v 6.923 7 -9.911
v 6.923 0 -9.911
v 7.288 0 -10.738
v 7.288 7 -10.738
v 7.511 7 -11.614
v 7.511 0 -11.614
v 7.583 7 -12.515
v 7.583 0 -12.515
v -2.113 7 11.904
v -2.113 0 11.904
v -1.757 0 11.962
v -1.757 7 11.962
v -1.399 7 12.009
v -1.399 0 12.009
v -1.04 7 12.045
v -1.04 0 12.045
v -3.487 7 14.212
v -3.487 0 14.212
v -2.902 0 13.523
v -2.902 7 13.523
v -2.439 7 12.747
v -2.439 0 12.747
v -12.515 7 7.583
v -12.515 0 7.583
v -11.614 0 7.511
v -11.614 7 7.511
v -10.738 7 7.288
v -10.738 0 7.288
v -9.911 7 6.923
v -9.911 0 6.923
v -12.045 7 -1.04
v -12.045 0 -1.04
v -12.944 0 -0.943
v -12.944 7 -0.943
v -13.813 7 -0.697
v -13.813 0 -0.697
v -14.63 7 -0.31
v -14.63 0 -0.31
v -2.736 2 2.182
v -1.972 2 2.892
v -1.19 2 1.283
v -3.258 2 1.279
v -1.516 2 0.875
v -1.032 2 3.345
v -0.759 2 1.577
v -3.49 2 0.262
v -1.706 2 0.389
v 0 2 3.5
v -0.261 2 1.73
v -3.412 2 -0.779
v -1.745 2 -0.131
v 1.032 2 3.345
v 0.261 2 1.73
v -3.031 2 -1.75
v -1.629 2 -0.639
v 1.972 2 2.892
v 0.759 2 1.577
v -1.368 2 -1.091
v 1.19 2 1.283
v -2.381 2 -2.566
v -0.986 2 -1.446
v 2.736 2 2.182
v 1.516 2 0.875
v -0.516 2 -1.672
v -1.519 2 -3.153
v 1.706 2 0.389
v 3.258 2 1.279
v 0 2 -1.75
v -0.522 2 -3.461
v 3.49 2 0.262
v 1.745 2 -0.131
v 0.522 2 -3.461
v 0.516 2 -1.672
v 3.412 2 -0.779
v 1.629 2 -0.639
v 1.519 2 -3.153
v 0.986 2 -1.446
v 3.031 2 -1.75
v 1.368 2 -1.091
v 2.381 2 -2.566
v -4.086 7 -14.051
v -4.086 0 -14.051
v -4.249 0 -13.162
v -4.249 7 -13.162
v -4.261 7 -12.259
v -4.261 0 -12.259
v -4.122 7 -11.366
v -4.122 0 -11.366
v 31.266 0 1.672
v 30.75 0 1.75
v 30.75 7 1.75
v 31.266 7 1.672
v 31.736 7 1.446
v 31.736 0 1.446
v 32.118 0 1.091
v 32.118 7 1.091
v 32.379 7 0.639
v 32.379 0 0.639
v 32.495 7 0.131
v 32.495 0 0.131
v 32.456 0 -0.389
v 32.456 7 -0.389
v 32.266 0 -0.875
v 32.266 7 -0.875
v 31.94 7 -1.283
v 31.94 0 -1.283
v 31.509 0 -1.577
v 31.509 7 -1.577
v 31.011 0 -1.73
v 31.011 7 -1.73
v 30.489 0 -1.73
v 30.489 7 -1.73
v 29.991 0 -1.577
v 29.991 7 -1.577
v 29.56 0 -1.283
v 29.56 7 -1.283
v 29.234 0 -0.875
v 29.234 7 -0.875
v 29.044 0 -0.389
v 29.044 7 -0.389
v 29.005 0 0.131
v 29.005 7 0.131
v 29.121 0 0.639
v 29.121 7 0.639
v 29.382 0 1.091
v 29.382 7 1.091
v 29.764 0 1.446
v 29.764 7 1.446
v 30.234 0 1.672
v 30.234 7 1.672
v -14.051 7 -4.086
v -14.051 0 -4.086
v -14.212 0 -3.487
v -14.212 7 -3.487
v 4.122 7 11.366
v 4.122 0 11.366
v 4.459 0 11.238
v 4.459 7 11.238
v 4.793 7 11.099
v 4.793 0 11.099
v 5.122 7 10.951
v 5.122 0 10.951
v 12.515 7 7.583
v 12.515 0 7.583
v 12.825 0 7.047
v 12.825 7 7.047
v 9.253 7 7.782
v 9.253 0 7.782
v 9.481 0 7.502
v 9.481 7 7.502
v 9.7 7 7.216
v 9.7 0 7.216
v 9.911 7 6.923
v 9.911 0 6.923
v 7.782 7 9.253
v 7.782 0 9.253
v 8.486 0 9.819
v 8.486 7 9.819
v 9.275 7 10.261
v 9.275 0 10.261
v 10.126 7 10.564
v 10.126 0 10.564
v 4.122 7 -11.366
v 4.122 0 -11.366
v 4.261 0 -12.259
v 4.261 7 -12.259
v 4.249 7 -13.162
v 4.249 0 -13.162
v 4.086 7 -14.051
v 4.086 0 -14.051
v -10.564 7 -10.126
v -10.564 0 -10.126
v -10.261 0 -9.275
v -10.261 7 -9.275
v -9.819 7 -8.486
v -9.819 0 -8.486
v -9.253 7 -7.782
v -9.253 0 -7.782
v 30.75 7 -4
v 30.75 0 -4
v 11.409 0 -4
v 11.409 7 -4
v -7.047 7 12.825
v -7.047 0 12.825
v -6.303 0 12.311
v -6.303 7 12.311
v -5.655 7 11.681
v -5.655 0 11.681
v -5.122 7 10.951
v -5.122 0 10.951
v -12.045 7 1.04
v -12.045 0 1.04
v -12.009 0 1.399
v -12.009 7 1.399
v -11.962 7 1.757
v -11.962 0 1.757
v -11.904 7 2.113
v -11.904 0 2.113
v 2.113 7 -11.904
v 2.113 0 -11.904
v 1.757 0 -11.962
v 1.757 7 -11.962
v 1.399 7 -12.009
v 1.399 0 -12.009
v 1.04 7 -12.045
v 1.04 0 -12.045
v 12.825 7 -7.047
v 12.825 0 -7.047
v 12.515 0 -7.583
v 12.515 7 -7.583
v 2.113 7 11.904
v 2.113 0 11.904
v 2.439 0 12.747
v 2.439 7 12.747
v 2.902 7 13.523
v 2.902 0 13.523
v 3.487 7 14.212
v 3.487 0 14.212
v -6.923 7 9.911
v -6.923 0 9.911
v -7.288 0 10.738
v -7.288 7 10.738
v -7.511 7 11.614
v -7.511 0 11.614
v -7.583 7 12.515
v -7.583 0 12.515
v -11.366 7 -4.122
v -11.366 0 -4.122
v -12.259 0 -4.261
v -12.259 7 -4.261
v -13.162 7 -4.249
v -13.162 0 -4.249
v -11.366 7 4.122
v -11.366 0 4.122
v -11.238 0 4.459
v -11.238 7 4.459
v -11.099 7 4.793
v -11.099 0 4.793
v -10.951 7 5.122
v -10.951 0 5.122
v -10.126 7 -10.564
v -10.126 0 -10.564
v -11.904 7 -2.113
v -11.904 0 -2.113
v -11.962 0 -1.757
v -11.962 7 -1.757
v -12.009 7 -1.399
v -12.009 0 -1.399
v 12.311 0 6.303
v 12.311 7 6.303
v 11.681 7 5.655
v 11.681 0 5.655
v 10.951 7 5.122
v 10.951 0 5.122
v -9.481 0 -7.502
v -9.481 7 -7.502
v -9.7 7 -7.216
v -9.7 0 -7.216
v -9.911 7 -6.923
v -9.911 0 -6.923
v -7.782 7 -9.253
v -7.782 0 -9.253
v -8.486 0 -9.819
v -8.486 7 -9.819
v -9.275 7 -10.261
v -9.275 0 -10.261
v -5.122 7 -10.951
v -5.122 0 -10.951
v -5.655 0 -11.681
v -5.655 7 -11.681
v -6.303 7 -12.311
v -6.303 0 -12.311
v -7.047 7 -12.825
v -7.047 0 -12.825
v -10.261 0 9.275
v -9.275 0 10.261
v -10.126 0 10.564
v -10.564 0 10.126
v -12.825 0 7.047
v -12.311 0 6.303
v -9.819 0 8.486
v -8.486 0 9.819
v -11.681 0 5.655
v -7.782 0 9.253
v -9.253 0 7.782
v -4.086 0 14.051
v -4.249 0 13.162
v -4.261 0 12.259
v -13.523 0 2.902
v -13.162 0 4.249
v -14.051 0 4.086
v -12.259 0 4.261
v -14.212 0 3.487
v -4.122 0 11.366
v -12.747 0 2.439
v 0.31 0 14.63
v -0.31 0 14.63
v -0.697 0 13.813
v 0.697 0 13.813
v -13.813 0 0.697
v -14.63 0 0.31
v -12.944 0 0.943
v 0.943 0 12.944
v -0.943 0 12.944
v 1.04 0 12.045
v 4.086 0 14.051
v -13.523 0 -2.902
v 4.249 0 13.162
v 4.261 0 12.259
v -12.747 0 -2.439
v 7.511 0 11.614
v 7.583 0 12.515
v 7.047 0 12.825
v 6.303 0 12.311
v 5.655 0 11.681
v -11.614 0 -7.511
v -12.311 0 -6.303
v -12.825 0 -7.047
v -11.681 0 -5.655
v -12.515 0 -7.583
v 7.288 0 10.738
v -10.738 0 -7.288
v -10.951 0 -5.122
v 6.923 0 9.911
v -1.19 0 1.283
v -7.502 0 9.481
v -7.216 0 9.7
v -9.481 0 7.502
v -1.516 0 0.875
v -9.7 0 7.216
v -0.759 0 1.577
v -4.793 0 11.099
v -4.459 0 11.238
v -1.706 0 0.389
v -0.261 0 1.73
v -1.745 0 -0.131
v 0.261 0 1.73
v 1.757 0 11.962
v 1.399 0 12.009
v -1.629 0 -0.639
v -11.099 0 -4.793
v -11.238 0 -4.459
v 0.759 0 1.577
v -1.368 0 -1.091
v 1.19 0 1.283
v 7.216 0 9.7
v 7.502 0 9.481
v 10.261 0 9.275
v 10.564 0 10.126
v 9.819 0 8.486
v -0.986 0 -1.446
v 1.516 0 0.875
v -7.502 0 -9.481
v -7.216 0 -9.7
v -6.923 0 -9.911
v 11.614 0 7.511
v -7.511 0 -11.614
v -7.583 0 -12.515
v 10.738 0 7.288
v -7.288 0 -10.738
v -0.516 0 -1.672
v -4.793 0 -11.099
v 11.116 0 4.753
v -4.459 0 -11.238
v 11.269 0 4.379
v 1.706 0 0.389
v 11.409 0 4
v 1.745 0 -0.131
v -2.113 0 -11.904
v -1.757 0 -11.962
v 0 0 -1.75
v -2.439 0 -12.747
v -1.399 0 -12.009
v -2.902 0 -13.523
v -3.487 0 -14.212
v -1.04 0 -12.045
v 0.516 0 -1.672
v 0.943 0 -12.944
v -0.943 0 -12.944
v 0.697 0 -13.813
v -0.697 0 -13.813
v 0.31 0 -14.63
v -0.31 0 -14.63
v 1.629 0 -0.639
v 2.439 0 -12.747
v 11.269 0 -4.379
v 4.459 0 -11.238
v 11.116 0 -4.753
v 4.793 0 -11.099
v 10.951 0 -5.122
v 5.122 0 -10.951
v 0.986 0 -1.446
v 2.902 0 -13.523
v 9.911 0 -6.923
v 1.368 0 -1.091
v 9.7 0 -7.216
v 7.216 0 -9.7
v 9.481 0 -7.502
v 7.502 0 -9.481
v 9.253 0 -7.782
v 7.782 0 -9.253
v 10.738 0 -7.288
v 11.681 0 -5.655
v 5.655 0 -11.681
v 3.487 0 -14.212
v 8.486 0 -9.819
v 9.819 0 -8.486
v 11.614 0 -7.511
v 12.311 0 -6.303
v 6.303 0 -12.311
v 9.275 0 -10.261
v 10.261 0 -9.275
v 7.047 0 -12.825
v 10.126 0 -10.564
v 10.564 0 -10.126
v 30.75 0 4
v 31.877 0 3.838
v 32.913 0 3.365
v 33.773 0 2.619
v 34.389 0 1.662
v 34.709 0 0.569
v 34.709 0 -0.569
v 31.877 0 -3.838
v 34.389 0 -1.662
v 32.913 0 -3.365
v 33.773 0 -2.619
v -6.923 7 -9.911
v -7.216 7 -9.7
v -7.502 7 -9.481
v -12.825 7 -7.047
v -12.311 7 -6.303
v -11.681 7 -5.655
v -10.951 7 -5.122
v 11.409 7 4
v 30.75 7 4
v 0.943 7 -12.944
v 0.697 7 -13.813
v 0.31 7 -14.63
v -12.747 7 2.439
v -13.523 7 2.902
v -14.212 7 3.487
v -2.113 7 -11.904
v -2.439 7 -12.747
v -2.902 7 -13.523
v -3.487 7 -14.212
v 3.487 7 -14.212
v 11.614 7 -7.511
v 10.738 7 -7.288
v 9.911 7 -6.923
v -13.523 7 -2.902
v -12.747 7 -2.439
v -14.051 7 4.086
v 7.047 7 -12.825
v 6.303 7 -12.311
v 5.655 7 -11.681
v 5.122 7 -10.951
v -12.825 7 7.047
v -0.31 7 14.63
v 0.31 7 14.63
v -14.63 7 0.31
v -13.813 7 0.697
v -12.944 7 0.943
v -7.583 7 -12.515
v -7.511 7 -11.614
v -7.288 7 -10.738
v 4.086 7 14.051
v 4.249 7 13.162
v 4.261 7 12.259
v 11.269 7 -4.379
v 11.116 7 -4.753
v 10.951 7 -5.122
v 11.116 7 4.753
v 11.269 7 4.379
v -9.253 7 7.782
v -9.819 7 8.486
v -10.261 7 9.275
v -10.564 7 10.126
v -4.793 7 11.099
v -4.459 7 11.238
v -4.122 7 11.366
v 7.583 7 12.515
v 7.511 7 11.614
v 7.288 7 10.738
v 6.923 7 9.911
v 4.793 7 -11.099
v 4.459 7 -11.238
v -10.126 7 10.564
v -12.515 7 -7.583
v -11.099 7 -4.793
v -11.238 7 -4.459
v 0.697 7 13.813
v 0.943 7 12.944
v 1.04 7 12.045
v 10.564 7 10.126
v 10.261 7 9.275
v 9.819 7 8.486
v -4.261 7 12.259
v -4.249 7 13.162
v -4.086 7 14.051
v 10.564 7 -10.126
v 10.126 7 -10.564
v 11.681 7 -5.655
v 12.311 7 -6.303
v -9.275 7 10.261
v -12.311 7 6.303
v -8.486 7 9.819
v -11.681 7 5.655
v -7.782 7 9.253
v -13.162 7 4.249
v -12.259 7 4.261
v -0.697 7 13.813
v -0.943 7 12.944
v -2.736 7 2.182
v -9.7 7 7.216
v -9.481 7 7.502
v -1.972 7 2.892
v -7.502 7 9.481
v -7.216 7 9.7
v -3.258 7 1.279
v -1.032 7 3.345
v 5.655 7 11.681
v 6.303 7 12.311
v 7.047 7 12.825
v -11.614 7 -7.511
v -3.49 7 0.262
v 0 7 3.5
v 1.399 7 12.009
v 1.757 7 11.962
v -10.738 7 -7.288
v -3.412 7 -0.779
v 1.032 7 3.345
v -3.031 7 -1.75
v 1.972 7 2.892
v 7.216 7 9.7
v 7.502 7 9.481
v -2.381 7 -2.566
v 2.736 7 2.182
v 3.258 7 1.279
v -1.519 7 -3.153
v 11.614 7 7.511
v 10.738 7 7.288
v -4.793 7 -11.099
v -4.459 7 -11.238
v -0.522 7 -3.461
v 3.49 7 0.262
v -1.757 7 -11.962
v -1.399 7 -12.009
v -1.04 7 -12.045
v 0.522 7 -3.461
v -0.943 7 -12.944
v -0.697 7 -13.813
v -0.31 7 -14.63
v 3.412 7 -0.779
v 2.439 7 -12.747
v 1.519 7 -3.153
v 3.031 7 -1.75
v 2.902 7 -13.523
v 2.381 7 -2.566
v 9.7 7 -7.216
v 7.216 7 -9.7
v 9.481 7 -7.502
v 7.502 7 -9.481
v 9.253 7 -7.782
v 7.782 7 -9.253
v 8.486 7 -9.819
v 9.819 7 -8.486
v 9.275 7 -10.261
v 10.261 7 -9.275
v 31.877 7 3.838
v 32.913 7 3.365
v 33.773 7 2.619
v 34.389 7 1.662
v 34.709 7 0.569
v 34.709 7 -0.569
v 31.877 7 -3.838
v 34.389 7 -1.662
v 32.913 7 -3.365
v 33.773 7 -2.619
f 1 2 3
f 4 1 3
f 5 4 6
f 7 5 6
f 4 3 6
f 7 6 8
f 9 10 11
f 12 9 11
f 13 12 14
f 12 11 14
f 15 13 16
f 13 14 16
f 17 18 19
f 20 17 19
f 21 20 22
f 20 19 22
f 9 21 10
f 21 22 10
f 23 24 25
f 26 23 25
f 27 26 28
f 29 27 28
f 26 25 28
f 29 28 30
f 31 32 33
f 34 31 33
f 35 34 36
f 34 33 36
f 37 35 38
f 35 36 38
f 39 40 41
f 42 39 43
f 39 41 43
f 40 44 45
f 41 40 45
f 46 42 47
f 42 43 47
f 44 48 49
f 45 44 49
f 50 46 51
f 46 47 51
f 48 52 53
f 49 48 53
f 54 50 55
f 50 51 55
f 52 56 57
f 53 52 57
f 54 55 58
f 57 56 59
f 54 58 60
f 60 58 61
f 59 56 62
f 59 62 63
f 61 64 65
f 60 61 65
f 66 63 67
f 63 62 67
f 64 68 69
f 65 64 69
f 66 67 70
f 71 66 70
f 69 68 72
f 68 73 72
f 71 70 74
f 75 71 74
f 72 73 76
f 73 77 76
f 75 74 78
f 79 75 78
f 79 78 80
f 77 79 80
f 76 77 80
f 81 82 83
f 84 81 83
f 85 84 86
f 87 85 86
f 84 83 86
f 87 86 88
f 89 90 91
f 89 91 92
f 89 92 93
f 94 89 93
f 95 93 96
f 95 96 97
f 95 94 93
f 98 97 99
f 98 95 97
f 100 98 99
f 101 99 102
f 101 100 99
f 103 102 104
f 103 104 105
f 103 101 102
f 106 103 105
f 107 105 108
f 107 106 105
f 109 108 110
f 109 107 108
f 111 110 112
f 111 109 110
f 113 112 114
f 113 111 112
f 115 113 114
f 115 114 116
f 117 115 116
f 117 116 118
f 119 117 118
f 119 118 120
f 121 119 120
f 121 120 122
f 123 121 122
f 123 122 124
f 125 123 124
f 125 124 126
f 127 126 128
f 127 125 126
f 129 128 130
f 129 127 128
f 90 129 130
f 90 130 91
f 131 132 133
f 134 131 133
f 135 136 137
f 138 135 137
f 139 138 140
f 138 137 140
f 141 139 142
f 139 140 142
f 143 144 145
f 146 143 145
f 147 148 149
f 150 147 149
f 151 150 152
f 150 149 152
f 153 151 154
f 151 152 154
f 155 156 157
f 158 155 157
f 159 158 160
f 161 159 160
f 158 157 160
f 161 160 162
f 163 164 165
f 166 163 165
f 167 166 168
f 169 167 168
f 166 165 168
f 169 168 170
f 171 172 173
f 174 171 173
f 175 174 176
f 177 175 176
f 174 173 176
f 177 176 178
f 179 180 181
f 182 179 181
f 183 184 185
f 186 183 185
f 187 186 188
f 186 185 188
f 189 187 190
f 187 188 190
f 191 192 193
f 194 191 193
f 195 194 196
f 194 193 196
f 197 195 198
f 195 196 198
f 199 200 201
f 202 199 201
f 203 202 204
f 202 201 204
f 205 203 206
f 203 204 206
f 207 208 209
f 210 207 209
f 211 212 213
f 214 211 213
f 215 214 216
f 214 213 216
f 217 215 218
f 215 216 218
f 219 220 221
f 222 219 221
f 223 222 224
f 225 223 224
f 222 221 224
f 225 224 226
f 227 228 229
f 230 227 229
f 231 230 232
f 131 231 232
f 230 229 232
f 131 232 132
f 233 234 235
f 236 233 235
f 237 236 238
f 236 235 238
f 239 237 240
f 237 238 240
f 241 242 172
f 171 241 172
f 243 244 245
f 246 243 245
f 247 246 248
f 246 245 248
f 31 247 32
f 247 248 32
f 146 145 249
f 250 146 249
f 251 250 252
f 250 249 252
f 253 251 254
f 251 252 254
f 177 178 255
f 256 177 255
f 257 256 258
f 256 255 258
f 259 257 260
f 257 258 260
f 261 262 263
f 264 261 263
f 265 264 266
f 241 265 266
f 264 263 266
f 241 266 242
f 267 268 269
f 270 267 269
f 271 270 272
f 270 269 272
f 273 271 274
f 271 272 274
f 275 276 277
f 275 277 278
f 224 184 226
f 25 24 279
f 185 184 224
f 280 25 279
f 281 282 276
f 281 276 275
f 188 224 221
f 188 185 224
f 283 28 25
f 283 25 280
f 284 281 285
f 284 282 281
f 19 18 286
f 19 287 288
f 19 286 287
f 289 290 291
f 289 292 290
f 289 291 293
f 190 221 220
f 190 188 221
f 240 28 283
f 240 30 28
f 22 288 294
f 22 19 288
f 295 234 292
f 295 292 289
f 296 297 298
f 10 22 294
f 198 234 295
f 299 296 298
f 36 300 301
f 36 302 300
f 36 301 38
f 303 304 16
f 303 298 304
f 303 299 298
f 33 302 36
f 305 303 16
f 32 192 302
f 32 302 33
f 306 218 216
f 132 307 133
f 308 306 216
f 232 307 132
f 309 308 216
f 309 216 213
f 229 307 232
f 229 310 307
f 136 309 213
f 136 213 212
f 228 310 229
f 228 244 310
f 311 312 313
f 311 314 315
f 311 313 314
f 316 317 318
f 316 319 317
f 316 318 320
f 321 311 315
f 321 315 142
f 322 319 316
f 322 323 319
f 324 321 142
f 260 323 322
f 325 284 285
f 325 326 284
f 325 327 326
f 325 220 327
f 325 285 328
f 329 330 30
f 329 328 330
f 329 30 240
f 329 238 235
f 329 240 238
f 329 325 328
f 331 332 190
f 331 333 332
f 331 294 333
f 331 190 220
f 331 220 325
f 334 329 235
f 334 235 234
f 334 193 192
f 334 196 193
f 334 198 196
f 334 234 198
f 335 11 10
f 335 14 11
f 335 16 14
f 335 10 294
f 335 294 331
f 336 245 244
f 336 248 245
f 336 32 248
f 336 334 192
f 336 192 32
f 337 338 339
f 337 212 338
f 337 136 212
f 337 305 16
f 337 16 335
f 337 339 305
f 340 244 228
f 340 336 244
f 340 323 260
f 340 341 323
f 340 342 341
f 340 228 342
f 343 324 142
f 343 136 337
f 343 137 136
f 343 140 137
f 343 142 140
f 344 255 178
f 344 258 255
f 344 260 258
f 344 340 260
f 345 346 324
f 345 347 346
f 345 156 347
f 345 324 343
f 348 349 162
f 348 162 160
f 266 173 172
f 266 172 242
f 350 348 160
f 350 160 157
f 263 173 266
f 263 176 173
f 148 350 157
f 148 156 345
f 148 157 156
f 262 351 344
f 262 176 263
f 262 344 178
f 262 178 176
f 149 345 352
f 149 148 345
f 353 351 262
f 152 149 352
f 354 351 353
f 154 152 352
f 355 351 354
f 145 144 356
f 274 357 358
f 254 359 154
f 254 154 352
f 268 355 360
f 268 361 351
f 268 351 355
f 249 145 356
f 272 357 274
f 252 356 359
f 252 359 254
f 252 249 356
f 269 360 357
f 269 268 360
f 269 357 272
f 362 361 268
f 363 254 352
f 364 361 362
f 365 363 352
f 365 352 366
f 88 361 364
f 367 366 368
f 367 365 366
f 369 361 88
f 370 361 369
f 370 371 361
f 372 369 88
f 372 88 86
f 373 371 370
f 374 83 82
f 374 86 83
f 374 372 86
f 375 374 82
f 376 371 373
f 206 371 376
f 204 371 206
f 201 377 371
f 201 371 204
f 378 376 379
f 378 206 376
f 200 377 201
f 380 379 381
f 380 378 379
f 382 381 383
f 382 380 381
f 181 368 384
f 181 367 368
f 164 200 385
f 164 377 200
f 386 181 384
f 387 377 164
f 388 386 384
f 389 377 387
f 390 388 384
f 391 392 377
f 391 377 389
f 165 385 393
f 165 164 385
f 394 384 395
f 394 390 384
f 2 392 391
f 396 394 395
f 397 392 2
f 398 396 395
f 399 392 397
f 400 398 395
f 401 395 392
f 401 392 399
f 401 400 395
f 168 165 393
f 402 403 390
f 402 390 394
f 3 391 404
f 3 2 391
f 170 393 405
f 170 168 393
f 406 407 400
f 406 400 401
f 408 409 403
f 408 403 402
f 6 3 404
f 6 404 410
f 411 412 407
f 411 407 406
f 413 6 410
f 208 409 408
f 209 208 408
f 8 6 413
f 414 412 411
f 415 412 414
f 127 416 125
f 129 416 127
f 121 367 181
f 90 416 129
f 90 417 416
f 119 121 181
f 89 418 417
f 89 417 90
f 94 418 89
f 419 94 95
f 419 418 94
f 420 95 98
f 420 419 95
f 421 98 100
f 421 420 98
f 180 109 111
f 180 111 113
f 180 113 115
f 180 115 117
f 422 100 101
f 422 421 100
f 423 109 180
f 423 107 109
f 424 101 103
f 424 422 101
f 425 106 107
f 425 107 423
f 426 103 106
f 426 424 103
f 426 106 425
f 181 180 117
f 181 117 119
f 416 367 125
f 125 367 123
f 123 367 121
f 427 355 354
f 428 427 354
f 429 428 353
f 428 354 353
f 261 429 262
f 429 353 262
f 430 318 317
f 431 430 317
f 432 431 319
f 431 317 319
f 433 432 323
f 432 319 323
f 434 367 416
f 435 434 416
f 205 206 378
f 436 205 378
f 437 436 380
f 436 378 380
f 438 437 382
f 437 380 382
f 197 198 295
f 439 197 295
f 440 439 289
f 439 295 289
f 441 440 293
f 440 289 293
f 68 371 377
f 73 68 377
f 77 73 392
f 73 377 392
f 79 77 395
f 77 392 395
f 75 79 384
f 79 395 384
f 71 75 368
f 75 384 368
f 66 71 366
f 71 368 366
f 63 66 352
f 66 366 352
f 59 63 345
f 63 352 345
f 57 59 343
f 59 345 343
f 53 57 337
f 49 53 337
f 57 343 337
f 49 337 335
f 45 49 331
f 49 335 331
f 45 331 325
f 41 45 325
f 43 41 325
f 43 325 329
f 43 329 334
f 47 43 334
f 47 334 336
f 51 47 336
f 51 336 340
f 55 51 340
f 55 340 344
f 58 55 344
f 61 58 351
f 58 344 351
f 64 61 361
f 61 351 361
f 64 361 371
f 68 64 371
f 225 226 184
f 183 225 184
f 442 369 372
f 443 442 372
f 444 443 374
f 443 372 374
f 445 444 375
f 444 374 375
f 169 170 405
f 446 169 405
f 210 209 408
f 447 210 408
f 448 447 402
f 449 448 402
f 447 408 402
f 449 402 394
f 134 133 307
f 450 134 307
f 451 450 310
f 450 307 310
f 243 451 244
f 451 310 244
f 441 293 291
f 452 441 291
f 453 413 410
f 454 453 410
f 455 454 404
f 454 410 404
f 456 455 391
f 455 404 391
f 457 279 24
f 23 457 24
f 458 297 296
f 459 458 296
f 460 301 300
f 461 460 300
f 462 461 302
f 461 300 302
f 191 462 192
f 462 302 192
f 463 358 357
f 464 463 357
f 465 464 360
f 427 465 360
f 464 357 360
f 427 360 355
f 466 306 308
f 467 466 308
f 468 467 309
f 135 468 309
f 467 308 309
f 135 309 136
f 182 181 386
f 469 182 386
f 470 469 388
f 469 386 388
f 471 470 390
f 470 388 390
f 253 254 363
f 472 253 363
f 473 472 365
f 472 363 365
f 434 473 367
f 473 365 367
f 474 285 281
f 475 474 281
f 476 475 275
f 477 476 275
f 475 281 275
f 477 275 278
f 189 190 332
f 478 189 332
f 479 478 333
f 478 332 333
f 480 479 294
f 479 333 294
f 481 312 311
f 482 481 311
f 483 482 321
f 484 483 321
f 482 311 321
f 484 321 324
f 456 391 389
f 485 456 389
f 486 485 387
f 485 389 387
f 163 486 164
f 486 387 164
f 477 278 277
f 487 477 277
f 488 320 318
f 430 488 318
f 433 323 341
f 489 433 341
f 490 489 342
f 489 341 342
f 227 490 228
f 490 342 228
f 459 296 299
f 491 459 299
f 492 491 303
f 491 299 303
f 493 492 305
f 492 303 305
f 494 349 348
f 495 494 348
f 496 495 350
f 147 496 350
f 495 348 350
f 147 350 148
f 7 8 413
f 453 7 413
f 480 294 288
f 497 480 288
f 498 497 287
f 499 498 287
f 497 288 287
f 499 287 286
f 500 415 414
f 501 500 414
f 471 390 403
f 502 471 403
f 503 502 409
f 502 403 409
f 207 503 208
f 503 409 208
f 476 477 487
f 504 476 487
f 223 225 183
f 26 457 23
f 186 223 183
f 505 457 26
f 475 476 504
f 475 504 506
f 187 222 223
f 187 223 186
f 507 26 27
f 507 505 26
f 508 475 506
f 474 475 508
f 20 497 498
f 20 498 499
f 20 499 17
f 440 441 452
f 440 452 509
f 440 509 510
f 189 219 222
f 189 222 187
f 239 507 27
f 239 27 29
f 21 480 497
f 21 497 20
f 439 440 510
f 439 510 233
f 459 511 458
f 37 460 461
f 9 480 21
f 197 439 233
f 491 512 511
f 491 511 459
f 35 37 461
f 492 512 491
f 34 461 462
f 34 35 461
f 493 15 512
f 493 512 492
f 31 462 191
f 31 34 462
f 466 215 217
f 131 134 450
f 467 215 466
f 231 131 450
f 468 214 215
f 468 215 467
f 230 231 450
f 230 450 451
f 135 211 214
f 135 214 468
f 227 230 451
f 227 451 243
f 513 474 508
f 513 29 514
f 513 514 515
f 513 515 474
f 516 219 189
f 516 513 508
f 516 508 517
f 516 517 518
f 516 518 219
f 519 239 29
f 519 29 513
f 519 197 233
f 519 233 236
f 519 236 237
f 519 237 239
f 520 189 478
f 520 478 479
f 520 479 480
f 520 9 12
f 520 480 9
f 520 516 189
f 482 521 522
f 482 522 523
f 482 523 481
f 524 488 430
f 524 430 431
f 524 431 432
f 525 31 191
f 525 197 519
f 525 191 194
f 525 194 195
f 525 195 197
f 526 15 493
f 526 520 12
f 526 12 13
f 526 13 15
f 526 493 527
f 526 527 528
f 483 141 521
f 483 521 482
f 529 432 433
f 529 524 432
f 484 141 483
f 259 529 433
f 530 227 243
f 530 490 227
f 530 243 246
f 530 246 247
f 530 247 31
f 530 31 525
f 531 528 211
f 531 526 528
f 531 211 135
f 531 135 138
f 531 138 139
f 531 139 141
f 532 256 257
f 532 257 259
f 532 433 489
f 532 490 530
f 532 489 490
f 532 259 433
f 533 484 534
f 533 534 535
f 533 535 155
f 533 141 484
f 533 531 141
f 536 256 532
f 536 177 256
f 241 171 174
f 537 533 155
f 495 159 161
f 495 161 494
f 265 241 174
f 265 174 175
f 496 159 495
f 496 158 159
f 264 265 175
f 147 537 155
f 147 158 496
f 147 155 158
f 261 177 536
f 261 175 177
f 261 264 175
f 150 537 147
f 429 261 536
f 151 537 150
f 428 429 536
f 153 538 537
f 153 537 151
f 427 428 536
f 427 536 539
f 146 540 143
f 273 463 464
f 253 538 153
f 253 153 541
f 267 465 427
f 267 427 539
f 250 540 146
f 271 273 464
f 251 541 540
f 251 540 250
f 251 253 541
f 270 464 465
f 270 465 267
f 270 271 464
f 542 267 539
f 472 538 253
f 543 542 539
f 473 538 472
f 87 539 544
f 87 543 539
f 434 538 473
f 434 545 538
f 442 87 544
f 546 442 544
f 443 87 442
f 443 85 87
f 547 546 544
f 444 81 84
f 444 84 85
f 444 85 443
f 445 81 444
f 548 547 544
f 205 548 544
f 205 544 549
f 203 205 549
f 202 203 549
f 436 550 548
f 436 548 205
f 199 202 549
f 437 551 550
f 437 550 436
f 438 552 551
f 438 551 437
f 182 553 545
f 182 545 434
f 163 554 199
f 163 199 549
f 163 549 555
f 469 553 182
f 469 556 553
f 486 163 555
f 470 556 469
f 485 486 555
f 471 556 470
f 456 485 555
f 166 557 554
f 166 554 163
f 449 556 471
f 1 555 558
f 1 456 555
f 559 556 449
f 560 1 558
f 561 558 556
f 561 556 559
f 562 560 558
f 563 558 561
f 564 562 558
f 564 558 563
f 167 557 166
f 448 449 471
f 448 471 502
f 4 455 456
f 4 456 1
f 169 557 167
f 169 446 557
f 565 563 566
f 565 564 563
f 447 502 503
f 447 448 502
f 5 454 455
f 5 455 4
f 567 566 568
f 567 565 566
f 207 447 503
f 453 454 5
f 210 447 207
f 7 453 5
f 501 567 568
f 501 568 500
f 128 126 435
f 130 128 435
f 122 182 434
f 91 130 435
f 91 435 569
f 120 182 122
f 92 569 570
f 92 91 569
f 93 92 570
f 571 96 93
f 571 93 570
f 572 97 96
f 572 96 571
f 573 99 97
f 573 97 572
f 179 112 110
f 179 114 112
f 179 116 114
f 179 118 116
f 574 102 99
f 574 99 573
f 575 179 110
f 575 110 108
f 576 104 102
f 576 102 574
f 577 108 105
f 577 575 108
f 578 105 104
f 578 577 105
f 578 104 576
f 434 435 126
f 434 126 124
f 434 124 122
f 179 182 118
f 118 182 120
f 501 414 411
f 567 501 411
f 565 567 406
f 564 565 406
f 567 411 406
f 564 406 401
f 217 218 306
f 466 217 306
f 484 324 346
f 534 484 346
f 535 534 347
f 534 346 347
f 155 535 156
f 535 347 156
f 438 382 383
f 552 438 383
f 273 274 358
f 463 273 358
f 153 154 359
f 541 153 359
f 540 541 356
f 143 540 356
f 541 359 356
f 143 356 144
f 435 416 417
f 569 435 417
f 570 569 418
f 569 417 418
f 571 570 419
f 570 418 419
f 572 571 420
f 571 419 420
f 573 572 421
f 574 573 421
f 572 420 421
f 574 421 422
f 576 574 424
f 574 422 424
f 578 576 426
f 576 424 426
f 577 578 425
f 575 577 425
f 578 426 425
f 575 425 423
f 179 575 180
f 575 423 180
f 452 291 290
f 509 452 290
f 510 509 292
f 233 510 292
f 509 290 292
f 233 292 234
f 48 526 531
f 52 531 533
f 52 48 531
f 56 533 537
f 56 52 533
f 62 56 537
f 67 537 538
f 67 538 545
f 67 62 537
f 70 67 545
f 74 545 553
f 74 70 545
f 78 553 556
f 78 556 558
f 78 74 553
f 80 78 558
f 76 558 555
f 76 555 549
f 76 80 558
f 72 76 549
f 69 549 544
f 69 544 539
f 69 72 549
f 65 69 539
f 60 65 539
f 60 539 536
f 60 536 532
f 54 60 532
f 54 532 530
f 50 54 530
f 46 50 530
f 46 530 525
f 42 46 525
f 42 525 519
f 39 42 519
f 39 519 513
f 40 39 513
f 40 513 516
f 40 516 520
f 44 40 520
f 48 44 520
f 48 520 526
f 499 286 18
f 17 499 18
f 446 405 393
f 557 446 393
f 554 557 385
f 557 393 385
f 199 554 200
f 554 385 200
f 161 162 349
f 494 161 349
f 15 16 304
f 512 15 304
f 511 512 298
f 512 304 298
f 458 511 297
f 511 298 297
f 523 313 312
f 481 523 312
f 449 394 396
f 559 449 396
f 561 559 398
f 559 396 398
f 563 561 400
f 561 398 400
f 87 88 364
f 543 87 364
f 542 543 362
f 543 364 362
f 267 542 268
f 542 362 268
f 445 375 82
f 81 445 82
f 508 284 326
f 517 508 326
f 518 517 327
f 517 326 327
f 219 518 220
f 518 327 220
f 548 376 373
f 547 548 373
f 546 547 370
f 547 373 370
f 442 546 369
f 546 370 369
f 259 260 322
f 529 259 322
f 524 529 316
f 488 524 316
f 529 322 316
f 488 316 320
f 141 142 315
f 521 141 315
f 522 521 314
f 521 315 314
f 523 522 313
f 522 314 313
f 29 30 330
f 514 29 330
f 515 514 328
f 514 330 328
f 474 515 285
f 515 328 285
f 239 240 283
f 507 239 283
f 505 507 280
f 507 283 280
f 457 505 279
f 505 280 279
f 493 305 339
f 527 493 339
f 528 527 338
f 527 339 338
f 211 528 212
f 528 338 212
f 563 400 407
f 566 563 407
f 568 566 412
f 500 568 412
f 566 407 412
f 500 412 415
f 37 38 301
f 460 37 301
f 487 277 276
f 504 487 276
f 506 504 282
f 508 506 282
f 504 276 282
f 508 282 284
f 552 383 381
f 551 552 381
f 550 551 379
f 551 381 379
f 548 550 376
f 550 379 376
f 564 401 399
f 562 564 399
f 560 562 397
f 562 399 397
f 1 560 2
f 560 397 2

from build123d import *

# Parameters (mm, degrees)
SKETCH1_R           = 3.5
SKETCH1_R_2         = 1.75
BOSS_EXTRUDE1_DEPTH = 7
SKETCH2_R           = 3.5
SKETCH2_R_2         = 1.75
BOSS_EXTRUDE2_DEPTH = 2


with BuildPart() as part:
    # Sketch1 → Boss-Extrude1 (new body)
    with BuildSketch(Plane(origin=(0, 0, 0), x_dir=(1, 0, 0), z_dir=(0, 1, 0))):
        with BuildLine():
            ThreePointArc((1.04, 12.04518576), (0.838273314, 13.383704325), (0.31, 14.63))
            Line((0.31, 14.63), (-0.31, 14.63))
            ThreePointArc((-0.31, 14.63), (-0.838273314, 13.383704325), (-1.04, 12.04518576))
            ThreePointArc((-1.04, 12.04518576), (-1.578061664, 11.986568374), (-2.112960617, 11.903927815))
            ThreePointArc((-2.112960617, 11.903927815), (-2.65424773, 13.144626757), (-3.487085624, 14.211728743))
            Line((-3.487085624, 14.211728743), (-4.085959636, 14.051260935))
            ThreePointArc((-4.085959636, 14.051260935), (-4.273667417, 12.71070456), (-4.122086336, 11.365584201))
            ThreePointArc((-4.122086336, 11.365584201), (-4.626642697, 11.169703548), (-5.12192646, 10.951436862))
            ThreePointArc((-5.12192646, 10.951436862), (-5.965886177, 12.009764599), (-7.046532125, 12.824951657))
            Line((-7.046532125, 12.824951657), (-7.583467875, 12.514951657))
            ThreePointArc((-7.583467875, 12.514951657), (-7.417818147, 11.171491285), (-6.9232593, 9.911436862))
            ThreePointArc((-6.9232593, 9.911436862), (-7.359925677, 9.591641884), (-7.781841479, 9.252623584))
            ThreePointArc((-7.781841479, 9.252623584), (-8.870959341, 10.05645683), (-10.125769107, 10.564175311))
            Line((-10.125769107, 10.564175311), (-10.564175311, 10.125769107))
            ThreePointArc((-10.564175311, 10.125769107), (-10.05645683, 8.870959341), (-9.252623584, 7.781841479))
            ThreePointArc((-9.252623584, 7.781841479), (-9.591641884, 7.359925677), (-9.911436862, 6.9232593))
            ThreePointArc((-9.911436862, 6.9232593), (-11.171491285, 7.417818147), (-12.514951657, 7.583467875))
            Line((-12.514951657, 7.583467875), (-12.824951657, 7.046532125))
            ThreePointArc((-12.824951657, 7.046532125), (-12.009764599, 5.965886177), (-10.951436862, 5.12192646))
            ThreePointArc((-10.951436862, 5.12192646), (-11.169703548, 4.626642697), (-11.365584201, 4.122086336))
            ThreePointArc((-11.365584201, 4.122086336), (-12.71070456, 4.273667417), (-14.051260935, 4.085959636))
            Line((-14.051260935, 4.085959636), (-14.211728743, 3.487085624))
            ThreePointArc((-14.211728743, 3.487085624), (-13.144626757, 2.65424773), (-11.903927815, 2.112960617))
            ThreePointArc((-11.903927815, 2.112960617), (-11.986568374, 1.578061664), (-12.04518576, 1.04))
            ThreePointArc((-12.04518576, 1.04), (-13.383704325, 0.838273314), (-14.63, 0.31))
            Line((-14.63, 0.31), (-14.63, -0.31))
            ThreePointArc((-14.63, -0.31), (-13.383704325, -0.838273314), (-12.04518576, -1.04))
            ThreePointArc((-12.04518576, -1.04), (-11.986568374, -1.578061664), (-11.903927815, -2.112960617))
            ThreePointArc((-11.903927815, -2.112960617), (-13.144626757, -2.65424773), (-14.211728743, -3.487085624))
            Line((-14.211728743, -3.487085624), (-14.051260935, -4.085959636))
            ThreePointArc((-14.051260935, -4.085959636), (-12.71070456, -4.273667417), (-11.365584201, -4.122086336))
            ThreePointArc((-11.365584201, -4.122086336), (-11.169703548, -4.626642697), (-10.951436862, -5.12192646))
            ThreePointArc((-10.951436862, -5.12192646), (-12.009764599, -5.965886177), (-12.824951657, -7.046532125))
            Line((-12.824951657, -7.046532125), (-12.514951657, -7.583467875))
            ThreePointArc((-12.514951657, -7.583467875), (-11.171491285, -7.417818147), (-9.911436862, -6.9232593))
            ThreePointArc((-9.911436862, -6.9232593), (-9.591641884, -7.359925677), (-9.252623584, -7.781841479))
            ThreePointArc((-9.252623584, -7.781841479), (-10.05645683, -8.870959341), (-10.564175311, -10.125769107))
            Line((-10.564175311, -10.125769107), (-10.125769107, -10.564175311))
            ThreePointArc((-10.125769107, -10.564175311), (-8.870959341, -10.05645683), (-7.781841479, -9.252623584))
            ThreePointArc((-7.781841479, -9.252623584), (-7.359925677, -9.591641884), (-6.9232593, -9.911436862))
            ThreePointArc((-6.9232593, -9.911436862), (-7.417818147, -11.171491285), (-7.583467875, -12.514951657))
            Line((-7.583467875, -12.514951657), (-7.046532125, -12.824951657))
            ThreePointArc((-7.046532125, -12.824951657), (-5.965886177, -12.009764599), (-5.12192646, -10.951436862))
            ThreePointArc((-5.12192646, -10.951436862), (-4.626642697, -11.169703548), (-4.122086336, -11.365584201))
            ThreePointArc((-4.122086336, -11.365584201), (-4.273667417, -12.71070456), (-4.085959636, -14.051260935))
            Line((-4.085959636, -14.051260935), (-3.487085624, -14.211728743))
            ThreePointArc((-3.487085624, -14.211728743), (-2.65424773, -13.144626757), (-2.112960617, -11.903927815))
            ThreePointArc((-2.112960617, -11.903927815), (-1.578061664, -11.986568374), (-1.04, -12.04518576))
            ThreePointArc((-1.04, -12.04518576), (-0.838273314, -13.383704325), (-0.31, -14.63))
            Line((-0.31, -14.63), (0.31, -14.63))
            ThreePointArc((0.31, -14.63), (0.838273314, -13.383704325), (1.04, -12.04518576))
            ThreePointArc((1.04, -12.04518576), (1.578061664, -11.986568374), (2.112960617, -11.903927815))
            ThreePointArc((2.112960617, -11.903927815), (2.65424773, -13.144626757), (3.487085624, -14.211728743))
            Line((3.487085624, -14.211728743), (4.085959636, -14.051260935))
            ThreePointArc((4.085959636, -14.051260935), (4.273667417, -12.71070456), (4.122086336, -11.365584201))
            ThreePointArc((4.122086336, -11.365584201), (4.626642697, -11.169703548), (5.12192646, -10.951436862))
            ThreePointArc((5.12192646, -10.951436862), (5.965886177, -12.009764599), (7.046532125, -12.824951657))
            Line((7.046532125, -12.824951657), (7.583467875, -12.514951657))
            ThreePointArc((7.583467875, -12.514951657), (7.417818147, -11.171491285), (6.9232593, -9.911436862))
            ThreePointArc((6.9232593, -9.911436862), (7.359925677, -9.591641884), (7.781841479, -9.252623584))
            ThreePointArc((7.781841479, -9.252623584), (8.870959341, -10.05645683), (10.125769107, -10.564175311))
            Line((10.125769107, -10.564175311), (10.564175311, -10.125769107))
            ThreePointArc((10.564175311, -10.125769107), (10.05645683, -8.870959341), (9.252623584, -7.781841479))
            ThreePointArc((9.252623584, -7.781841479), (9.591641884, -7.359925677), (9.911436862, -6.9232593))
            ThreePointArc((9.911436862, -6.9232593), (11.171491285, -7.417818147), (12.514951657, -7.583467875))
            Line((12.514951657, -7.583467875), (12.824951657, -7.046532125))
            ThreePointArc((12.824951657, -7.046532125), (12.009764599, -5.965886177), (10.951436862, -5.12192646))
            ThreePointArc((10.951436862, -5.12192646), (11.194344337, -4.566700654), (11.409123542, -4))
            Line((11.409123542, -4), (30.75, -4))
            ThreePointArc((30.75, -4), (34.75, 0), (30.75, 4))
            Line((30.75, 4), (11.409123542, 4))
            ThreePointArc((11.409123542, 4), (11.194344337, 4.566700654), (10.951436862, 5.12192646))
            ThreePointArc((10.951436862, 5.12192646), (12.009764599, 5.965886177), (12.824951657, 7.046532125))
            Line((12.824951657, 7.046532125), (12.514951657, 7.583467875))
            ThreePointArc((12.514951657, 7.583467875), (11.171491285, 7.417818147), (9.911436862, 6.9232593))
            ThreePointArc((9.911436862, 6.9232593), (9.591641884, 7.359925677), (9.252623584, 7.781841479))
            ThreePointArc((9.252623584, 7.781841479), (10.05645683, 8.870959341), (10.564175311, 10.125769107))
            Line((10.564175311, 10.125769107), (10.125769107, 10.564175311))
            ThreePointArc((10.125769107, 10.564175311), (8.870959341, 10.05645683), (7.781841479, 9.252623584))
            ThreePointArc((7.781841479, 9.252623584), (7.359925677, 9.591641884), (6.9232593, 9.911436862))
            ThreePointArc((6.9232593, 9.911436862), (7.417818147, 11.171491285), (7.583467875, 12.514951657))
            Line((7.583467875, 12.514951657), (7.046532125, 12.824951657))
            ThreePointArc((7.046532125, 12.824951657), (5.965886177, 12.009764599), (5.12192646, 10.951436862))
            ThreePointArc((5.12192646, 10.951436862), (4.626642697, 11.169703548), (4.122086336, 11.365584201))
            ThreePointArc((4.122086336, 11.365584201), (4.273667417, 12.71070456), (4.085959636, 14.051260935))
            Line((4.085959636, 14.051260935), (3.487085624, 14.211728743))
            ThreePointArc((3.487085624, 14.211728743), (2.65424773, 13.144626757), (2.112960617, 11.903927815))
            ThreePointArc((2.112960617, 11.903927815), (1.578061664, 11.986568374), (1.04, 12.04518576))
        make_face()
        with Locations(Location((0, 0, 0), (0, 0, 270))):
            Circle(SKETCH1_R, mode=Mode.SUBTRACT)
        with Locations(Location((30.75, 0, 0), (0, 0, 270))):
            Circle(SKETCH1_R_2, mode=Mode.SUBTRACT)
    extrude(amount=BOSS_EXTRUDE1_DEPTH)

    # Sketch2 → Boss-Extrude2 (add)
    with BuildSketch(Plane.XZ):
        with Locations(Location((0, 0, 0), (0, 0, 270))):
            Circle(SKETCH2_R)
        with Locations(Location((0, 0, 0), (0, 0, 270))):
            Circle(SKETCH2_R_2, mode=Mode.SUBTRACT)
    extrude(amount=-BOSS_EXTRUDE2_DEPTH)


solid = part.part
